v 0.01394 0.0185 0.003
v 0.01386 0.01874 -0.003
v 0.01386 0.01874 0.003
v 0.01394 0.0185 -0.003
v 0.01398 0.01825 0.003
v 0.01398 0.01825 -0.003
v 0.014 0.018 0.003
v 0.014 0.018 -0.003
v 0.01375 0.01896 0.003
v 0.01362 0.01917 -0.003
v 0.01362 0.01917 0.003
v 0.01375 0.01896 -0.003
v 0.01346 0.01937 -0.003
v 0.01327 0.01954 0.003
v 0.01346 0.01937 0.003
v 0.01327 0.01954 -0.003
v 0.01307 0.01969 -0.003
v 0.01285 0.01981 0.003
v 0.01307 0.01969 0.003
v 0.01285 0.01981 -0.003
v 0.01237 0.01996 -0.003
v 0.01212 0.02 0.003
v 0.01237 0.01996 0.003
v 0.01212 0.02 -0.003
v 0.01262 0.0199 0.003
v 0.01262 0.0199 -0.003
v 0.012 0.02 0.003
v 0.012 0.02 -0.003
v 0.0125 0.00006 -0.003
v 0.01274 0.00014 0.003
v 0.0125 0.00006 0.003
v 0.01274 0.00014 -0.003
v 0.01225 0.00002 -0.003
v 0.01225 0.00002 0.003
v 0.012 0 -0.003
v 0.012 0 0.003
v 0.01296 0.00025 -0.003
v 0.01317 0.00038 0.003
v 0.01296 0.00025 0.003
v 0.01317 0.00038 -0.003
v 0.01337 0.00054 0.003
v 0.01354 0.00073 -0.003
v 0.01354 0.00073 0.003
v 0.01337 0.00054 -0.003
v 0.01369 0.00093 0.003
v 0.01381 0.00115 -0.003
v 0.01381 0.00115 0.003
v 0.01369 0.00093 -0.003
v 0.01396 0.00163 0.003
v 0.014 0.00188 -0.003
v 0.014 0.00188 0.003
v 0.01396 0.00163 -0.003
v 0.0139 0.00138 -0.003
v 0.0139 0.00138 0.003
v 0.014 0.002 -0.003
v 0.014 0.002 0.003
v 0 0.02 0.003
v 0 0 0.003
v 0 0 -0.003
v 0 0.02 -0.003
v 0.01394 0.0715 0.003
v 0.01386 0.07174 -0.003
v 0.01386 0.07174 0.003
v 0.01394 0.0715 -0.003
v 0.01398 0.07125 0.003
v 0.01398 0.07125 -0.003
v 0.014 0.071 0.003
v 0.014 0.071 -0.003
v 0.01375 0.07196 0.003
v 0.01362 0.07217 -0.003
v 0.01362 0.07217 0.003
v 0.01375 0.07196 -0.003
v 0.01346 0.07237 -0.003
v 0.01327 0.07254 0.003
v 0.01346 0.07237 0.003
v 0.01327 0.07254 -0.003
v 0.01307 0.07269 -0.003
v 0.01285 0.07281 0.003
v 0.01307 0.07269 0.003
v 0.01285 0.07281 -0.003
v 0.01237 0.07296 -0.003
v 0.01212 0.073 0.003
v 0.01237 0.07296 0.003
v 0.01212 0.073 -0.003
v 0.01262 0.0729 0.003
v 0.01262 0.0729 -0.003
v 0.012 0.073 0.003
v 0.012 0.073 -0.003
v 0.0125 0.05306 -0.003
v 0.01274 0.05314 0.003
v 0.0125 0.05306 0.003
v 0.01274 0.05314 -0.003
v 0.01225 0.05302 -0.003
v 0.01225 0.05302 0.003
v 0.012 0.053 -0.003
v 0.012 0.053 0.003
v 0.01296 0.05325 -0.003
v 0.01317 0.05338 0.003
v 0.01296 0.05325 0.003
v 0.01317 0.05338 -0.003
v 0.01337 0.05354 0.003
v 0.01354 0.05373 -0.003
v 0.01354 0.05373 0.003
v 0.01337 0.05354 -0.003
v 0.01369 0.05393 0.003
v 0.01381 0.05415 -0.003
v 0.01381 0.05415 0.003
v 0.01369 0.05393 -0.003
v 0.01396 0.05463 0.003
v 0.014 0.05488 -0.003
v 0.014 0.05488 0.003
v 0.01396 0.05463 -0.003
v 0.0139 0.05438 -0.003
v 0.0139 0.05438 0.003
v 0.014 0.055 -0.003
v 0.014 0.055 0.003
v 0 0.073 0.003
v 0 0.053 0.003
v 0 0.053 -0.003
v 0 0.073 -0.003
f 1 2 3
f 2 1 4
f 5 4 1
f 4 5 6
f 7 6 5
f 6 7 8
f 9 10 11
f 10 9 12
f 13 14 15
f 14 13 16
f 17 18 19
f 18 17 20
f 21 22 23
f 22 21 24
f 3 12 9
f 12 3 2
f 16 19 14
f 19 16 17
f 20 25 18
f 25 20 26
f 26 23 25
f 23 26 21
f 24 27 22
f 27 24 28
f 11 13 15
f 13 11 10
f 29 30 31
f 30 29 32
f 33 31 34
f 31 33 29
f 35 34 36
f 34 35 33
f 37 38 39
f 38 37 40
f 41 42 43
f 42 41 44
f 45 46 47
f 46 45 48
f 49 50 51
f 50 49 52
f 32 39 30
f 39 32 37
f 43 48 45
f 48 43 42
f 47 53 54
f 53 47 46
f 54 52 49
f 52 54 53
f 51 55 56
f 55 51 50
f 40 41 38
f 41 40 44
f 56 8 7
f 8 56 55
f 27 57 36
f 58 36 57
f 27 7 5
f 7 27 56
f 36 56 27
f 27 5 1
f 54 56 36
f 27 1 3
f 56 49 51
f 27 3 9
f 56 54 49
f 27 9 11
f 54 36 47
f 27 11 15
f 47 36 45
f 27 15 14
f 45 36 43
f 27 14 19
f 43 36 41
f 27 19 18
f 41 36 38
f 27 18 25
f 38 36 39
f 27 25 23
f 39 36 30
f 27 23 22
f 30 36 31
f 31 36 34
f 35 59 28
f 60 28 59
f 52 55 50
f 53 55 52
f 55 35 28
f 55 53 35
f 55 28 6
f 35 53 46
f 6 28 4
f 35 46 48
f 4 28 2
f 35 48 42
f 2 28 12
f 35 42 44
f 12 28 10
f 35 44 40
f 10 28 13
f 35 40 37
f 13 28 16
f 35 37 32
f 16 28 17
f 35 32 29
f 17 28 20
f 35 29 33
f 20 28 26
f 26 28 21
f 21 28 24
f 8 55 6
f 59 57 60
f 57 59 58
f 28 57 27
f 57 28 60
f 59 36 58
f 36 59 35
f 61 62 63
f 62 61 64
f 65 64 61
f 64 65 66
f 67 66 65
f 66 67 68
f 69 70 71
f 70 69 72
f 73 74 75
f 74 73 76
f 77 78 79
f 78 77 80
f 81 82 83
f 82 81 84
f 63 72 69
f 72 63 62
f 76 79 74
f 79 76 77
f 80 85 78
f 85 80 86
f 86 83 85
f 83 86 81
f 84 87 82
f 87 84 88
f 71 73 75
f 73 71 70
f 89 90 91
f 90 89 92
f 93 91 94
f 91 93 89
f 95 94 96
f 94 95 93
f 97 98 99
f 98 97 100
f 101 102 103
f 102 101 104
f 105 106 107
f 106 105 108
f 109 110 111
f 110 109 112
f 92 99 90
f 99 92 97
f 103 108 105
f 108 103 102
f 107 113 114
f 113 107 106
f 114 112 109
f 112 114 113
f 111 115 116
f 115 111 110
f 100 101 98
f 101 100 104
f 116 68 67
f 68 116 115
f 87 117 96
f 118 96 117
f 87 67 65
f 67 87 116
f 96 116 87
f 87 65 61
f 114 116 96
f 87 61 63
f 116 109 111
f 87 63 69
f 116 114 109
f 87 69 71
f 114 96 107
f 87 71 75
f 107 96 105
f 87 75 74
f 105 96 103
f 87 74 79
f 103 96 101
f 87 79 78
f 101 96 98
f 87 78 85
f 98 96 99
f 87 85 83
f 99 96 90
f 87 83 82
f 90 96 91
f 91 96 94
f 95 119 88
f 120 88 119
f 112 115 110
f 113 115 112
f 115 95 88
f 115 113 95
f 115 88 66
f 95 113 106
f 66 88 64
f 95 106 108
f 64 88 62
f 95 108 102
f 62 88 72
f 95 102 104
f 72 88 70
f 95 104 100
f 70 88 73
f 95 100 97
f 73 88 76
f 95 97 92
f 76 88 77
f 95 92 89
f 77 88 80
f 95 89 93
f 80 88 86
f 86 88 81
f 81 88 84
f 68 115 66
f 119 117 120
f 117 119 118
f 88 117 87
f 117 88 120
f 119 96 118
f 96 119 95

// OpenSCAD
// Dimensions in m (SI)
tab_height = 0.014;
tab_width  = 0.020;
tab_thick  = 0.006;
tab_space  = 0.053;
tab_round  = 0.002;

// first tab
tab();
// second tab
translate([0,tab_space,0]) tab();

module tab()
{
    translate([0,0,-tab_thick/2])
    difference()
    {
        cube(size=[tab_height,
                   tab_width,
                   tab_thick],
             center=false);

        translate([tab_height-tab_round,
                   tab_width -tab_round,
                   0])
        round_cut();

        translate([tab_height-tab_round,
                   tab_round,
                   0])
        rotate([0,0,-90])
        round_cut();
    }
}

module round_cut()
{
    translate([0,0,-tab_thick/2])
    difference()
    {
        cube(size=[tab_round*1.1,
                   tab_round*1.1,
                   tab_thick*2],
             center=false);
        cylinder(h=tab_thick*2,
                 r=tab_round,
                 center=false,
                 $fn=50);
    }
}
